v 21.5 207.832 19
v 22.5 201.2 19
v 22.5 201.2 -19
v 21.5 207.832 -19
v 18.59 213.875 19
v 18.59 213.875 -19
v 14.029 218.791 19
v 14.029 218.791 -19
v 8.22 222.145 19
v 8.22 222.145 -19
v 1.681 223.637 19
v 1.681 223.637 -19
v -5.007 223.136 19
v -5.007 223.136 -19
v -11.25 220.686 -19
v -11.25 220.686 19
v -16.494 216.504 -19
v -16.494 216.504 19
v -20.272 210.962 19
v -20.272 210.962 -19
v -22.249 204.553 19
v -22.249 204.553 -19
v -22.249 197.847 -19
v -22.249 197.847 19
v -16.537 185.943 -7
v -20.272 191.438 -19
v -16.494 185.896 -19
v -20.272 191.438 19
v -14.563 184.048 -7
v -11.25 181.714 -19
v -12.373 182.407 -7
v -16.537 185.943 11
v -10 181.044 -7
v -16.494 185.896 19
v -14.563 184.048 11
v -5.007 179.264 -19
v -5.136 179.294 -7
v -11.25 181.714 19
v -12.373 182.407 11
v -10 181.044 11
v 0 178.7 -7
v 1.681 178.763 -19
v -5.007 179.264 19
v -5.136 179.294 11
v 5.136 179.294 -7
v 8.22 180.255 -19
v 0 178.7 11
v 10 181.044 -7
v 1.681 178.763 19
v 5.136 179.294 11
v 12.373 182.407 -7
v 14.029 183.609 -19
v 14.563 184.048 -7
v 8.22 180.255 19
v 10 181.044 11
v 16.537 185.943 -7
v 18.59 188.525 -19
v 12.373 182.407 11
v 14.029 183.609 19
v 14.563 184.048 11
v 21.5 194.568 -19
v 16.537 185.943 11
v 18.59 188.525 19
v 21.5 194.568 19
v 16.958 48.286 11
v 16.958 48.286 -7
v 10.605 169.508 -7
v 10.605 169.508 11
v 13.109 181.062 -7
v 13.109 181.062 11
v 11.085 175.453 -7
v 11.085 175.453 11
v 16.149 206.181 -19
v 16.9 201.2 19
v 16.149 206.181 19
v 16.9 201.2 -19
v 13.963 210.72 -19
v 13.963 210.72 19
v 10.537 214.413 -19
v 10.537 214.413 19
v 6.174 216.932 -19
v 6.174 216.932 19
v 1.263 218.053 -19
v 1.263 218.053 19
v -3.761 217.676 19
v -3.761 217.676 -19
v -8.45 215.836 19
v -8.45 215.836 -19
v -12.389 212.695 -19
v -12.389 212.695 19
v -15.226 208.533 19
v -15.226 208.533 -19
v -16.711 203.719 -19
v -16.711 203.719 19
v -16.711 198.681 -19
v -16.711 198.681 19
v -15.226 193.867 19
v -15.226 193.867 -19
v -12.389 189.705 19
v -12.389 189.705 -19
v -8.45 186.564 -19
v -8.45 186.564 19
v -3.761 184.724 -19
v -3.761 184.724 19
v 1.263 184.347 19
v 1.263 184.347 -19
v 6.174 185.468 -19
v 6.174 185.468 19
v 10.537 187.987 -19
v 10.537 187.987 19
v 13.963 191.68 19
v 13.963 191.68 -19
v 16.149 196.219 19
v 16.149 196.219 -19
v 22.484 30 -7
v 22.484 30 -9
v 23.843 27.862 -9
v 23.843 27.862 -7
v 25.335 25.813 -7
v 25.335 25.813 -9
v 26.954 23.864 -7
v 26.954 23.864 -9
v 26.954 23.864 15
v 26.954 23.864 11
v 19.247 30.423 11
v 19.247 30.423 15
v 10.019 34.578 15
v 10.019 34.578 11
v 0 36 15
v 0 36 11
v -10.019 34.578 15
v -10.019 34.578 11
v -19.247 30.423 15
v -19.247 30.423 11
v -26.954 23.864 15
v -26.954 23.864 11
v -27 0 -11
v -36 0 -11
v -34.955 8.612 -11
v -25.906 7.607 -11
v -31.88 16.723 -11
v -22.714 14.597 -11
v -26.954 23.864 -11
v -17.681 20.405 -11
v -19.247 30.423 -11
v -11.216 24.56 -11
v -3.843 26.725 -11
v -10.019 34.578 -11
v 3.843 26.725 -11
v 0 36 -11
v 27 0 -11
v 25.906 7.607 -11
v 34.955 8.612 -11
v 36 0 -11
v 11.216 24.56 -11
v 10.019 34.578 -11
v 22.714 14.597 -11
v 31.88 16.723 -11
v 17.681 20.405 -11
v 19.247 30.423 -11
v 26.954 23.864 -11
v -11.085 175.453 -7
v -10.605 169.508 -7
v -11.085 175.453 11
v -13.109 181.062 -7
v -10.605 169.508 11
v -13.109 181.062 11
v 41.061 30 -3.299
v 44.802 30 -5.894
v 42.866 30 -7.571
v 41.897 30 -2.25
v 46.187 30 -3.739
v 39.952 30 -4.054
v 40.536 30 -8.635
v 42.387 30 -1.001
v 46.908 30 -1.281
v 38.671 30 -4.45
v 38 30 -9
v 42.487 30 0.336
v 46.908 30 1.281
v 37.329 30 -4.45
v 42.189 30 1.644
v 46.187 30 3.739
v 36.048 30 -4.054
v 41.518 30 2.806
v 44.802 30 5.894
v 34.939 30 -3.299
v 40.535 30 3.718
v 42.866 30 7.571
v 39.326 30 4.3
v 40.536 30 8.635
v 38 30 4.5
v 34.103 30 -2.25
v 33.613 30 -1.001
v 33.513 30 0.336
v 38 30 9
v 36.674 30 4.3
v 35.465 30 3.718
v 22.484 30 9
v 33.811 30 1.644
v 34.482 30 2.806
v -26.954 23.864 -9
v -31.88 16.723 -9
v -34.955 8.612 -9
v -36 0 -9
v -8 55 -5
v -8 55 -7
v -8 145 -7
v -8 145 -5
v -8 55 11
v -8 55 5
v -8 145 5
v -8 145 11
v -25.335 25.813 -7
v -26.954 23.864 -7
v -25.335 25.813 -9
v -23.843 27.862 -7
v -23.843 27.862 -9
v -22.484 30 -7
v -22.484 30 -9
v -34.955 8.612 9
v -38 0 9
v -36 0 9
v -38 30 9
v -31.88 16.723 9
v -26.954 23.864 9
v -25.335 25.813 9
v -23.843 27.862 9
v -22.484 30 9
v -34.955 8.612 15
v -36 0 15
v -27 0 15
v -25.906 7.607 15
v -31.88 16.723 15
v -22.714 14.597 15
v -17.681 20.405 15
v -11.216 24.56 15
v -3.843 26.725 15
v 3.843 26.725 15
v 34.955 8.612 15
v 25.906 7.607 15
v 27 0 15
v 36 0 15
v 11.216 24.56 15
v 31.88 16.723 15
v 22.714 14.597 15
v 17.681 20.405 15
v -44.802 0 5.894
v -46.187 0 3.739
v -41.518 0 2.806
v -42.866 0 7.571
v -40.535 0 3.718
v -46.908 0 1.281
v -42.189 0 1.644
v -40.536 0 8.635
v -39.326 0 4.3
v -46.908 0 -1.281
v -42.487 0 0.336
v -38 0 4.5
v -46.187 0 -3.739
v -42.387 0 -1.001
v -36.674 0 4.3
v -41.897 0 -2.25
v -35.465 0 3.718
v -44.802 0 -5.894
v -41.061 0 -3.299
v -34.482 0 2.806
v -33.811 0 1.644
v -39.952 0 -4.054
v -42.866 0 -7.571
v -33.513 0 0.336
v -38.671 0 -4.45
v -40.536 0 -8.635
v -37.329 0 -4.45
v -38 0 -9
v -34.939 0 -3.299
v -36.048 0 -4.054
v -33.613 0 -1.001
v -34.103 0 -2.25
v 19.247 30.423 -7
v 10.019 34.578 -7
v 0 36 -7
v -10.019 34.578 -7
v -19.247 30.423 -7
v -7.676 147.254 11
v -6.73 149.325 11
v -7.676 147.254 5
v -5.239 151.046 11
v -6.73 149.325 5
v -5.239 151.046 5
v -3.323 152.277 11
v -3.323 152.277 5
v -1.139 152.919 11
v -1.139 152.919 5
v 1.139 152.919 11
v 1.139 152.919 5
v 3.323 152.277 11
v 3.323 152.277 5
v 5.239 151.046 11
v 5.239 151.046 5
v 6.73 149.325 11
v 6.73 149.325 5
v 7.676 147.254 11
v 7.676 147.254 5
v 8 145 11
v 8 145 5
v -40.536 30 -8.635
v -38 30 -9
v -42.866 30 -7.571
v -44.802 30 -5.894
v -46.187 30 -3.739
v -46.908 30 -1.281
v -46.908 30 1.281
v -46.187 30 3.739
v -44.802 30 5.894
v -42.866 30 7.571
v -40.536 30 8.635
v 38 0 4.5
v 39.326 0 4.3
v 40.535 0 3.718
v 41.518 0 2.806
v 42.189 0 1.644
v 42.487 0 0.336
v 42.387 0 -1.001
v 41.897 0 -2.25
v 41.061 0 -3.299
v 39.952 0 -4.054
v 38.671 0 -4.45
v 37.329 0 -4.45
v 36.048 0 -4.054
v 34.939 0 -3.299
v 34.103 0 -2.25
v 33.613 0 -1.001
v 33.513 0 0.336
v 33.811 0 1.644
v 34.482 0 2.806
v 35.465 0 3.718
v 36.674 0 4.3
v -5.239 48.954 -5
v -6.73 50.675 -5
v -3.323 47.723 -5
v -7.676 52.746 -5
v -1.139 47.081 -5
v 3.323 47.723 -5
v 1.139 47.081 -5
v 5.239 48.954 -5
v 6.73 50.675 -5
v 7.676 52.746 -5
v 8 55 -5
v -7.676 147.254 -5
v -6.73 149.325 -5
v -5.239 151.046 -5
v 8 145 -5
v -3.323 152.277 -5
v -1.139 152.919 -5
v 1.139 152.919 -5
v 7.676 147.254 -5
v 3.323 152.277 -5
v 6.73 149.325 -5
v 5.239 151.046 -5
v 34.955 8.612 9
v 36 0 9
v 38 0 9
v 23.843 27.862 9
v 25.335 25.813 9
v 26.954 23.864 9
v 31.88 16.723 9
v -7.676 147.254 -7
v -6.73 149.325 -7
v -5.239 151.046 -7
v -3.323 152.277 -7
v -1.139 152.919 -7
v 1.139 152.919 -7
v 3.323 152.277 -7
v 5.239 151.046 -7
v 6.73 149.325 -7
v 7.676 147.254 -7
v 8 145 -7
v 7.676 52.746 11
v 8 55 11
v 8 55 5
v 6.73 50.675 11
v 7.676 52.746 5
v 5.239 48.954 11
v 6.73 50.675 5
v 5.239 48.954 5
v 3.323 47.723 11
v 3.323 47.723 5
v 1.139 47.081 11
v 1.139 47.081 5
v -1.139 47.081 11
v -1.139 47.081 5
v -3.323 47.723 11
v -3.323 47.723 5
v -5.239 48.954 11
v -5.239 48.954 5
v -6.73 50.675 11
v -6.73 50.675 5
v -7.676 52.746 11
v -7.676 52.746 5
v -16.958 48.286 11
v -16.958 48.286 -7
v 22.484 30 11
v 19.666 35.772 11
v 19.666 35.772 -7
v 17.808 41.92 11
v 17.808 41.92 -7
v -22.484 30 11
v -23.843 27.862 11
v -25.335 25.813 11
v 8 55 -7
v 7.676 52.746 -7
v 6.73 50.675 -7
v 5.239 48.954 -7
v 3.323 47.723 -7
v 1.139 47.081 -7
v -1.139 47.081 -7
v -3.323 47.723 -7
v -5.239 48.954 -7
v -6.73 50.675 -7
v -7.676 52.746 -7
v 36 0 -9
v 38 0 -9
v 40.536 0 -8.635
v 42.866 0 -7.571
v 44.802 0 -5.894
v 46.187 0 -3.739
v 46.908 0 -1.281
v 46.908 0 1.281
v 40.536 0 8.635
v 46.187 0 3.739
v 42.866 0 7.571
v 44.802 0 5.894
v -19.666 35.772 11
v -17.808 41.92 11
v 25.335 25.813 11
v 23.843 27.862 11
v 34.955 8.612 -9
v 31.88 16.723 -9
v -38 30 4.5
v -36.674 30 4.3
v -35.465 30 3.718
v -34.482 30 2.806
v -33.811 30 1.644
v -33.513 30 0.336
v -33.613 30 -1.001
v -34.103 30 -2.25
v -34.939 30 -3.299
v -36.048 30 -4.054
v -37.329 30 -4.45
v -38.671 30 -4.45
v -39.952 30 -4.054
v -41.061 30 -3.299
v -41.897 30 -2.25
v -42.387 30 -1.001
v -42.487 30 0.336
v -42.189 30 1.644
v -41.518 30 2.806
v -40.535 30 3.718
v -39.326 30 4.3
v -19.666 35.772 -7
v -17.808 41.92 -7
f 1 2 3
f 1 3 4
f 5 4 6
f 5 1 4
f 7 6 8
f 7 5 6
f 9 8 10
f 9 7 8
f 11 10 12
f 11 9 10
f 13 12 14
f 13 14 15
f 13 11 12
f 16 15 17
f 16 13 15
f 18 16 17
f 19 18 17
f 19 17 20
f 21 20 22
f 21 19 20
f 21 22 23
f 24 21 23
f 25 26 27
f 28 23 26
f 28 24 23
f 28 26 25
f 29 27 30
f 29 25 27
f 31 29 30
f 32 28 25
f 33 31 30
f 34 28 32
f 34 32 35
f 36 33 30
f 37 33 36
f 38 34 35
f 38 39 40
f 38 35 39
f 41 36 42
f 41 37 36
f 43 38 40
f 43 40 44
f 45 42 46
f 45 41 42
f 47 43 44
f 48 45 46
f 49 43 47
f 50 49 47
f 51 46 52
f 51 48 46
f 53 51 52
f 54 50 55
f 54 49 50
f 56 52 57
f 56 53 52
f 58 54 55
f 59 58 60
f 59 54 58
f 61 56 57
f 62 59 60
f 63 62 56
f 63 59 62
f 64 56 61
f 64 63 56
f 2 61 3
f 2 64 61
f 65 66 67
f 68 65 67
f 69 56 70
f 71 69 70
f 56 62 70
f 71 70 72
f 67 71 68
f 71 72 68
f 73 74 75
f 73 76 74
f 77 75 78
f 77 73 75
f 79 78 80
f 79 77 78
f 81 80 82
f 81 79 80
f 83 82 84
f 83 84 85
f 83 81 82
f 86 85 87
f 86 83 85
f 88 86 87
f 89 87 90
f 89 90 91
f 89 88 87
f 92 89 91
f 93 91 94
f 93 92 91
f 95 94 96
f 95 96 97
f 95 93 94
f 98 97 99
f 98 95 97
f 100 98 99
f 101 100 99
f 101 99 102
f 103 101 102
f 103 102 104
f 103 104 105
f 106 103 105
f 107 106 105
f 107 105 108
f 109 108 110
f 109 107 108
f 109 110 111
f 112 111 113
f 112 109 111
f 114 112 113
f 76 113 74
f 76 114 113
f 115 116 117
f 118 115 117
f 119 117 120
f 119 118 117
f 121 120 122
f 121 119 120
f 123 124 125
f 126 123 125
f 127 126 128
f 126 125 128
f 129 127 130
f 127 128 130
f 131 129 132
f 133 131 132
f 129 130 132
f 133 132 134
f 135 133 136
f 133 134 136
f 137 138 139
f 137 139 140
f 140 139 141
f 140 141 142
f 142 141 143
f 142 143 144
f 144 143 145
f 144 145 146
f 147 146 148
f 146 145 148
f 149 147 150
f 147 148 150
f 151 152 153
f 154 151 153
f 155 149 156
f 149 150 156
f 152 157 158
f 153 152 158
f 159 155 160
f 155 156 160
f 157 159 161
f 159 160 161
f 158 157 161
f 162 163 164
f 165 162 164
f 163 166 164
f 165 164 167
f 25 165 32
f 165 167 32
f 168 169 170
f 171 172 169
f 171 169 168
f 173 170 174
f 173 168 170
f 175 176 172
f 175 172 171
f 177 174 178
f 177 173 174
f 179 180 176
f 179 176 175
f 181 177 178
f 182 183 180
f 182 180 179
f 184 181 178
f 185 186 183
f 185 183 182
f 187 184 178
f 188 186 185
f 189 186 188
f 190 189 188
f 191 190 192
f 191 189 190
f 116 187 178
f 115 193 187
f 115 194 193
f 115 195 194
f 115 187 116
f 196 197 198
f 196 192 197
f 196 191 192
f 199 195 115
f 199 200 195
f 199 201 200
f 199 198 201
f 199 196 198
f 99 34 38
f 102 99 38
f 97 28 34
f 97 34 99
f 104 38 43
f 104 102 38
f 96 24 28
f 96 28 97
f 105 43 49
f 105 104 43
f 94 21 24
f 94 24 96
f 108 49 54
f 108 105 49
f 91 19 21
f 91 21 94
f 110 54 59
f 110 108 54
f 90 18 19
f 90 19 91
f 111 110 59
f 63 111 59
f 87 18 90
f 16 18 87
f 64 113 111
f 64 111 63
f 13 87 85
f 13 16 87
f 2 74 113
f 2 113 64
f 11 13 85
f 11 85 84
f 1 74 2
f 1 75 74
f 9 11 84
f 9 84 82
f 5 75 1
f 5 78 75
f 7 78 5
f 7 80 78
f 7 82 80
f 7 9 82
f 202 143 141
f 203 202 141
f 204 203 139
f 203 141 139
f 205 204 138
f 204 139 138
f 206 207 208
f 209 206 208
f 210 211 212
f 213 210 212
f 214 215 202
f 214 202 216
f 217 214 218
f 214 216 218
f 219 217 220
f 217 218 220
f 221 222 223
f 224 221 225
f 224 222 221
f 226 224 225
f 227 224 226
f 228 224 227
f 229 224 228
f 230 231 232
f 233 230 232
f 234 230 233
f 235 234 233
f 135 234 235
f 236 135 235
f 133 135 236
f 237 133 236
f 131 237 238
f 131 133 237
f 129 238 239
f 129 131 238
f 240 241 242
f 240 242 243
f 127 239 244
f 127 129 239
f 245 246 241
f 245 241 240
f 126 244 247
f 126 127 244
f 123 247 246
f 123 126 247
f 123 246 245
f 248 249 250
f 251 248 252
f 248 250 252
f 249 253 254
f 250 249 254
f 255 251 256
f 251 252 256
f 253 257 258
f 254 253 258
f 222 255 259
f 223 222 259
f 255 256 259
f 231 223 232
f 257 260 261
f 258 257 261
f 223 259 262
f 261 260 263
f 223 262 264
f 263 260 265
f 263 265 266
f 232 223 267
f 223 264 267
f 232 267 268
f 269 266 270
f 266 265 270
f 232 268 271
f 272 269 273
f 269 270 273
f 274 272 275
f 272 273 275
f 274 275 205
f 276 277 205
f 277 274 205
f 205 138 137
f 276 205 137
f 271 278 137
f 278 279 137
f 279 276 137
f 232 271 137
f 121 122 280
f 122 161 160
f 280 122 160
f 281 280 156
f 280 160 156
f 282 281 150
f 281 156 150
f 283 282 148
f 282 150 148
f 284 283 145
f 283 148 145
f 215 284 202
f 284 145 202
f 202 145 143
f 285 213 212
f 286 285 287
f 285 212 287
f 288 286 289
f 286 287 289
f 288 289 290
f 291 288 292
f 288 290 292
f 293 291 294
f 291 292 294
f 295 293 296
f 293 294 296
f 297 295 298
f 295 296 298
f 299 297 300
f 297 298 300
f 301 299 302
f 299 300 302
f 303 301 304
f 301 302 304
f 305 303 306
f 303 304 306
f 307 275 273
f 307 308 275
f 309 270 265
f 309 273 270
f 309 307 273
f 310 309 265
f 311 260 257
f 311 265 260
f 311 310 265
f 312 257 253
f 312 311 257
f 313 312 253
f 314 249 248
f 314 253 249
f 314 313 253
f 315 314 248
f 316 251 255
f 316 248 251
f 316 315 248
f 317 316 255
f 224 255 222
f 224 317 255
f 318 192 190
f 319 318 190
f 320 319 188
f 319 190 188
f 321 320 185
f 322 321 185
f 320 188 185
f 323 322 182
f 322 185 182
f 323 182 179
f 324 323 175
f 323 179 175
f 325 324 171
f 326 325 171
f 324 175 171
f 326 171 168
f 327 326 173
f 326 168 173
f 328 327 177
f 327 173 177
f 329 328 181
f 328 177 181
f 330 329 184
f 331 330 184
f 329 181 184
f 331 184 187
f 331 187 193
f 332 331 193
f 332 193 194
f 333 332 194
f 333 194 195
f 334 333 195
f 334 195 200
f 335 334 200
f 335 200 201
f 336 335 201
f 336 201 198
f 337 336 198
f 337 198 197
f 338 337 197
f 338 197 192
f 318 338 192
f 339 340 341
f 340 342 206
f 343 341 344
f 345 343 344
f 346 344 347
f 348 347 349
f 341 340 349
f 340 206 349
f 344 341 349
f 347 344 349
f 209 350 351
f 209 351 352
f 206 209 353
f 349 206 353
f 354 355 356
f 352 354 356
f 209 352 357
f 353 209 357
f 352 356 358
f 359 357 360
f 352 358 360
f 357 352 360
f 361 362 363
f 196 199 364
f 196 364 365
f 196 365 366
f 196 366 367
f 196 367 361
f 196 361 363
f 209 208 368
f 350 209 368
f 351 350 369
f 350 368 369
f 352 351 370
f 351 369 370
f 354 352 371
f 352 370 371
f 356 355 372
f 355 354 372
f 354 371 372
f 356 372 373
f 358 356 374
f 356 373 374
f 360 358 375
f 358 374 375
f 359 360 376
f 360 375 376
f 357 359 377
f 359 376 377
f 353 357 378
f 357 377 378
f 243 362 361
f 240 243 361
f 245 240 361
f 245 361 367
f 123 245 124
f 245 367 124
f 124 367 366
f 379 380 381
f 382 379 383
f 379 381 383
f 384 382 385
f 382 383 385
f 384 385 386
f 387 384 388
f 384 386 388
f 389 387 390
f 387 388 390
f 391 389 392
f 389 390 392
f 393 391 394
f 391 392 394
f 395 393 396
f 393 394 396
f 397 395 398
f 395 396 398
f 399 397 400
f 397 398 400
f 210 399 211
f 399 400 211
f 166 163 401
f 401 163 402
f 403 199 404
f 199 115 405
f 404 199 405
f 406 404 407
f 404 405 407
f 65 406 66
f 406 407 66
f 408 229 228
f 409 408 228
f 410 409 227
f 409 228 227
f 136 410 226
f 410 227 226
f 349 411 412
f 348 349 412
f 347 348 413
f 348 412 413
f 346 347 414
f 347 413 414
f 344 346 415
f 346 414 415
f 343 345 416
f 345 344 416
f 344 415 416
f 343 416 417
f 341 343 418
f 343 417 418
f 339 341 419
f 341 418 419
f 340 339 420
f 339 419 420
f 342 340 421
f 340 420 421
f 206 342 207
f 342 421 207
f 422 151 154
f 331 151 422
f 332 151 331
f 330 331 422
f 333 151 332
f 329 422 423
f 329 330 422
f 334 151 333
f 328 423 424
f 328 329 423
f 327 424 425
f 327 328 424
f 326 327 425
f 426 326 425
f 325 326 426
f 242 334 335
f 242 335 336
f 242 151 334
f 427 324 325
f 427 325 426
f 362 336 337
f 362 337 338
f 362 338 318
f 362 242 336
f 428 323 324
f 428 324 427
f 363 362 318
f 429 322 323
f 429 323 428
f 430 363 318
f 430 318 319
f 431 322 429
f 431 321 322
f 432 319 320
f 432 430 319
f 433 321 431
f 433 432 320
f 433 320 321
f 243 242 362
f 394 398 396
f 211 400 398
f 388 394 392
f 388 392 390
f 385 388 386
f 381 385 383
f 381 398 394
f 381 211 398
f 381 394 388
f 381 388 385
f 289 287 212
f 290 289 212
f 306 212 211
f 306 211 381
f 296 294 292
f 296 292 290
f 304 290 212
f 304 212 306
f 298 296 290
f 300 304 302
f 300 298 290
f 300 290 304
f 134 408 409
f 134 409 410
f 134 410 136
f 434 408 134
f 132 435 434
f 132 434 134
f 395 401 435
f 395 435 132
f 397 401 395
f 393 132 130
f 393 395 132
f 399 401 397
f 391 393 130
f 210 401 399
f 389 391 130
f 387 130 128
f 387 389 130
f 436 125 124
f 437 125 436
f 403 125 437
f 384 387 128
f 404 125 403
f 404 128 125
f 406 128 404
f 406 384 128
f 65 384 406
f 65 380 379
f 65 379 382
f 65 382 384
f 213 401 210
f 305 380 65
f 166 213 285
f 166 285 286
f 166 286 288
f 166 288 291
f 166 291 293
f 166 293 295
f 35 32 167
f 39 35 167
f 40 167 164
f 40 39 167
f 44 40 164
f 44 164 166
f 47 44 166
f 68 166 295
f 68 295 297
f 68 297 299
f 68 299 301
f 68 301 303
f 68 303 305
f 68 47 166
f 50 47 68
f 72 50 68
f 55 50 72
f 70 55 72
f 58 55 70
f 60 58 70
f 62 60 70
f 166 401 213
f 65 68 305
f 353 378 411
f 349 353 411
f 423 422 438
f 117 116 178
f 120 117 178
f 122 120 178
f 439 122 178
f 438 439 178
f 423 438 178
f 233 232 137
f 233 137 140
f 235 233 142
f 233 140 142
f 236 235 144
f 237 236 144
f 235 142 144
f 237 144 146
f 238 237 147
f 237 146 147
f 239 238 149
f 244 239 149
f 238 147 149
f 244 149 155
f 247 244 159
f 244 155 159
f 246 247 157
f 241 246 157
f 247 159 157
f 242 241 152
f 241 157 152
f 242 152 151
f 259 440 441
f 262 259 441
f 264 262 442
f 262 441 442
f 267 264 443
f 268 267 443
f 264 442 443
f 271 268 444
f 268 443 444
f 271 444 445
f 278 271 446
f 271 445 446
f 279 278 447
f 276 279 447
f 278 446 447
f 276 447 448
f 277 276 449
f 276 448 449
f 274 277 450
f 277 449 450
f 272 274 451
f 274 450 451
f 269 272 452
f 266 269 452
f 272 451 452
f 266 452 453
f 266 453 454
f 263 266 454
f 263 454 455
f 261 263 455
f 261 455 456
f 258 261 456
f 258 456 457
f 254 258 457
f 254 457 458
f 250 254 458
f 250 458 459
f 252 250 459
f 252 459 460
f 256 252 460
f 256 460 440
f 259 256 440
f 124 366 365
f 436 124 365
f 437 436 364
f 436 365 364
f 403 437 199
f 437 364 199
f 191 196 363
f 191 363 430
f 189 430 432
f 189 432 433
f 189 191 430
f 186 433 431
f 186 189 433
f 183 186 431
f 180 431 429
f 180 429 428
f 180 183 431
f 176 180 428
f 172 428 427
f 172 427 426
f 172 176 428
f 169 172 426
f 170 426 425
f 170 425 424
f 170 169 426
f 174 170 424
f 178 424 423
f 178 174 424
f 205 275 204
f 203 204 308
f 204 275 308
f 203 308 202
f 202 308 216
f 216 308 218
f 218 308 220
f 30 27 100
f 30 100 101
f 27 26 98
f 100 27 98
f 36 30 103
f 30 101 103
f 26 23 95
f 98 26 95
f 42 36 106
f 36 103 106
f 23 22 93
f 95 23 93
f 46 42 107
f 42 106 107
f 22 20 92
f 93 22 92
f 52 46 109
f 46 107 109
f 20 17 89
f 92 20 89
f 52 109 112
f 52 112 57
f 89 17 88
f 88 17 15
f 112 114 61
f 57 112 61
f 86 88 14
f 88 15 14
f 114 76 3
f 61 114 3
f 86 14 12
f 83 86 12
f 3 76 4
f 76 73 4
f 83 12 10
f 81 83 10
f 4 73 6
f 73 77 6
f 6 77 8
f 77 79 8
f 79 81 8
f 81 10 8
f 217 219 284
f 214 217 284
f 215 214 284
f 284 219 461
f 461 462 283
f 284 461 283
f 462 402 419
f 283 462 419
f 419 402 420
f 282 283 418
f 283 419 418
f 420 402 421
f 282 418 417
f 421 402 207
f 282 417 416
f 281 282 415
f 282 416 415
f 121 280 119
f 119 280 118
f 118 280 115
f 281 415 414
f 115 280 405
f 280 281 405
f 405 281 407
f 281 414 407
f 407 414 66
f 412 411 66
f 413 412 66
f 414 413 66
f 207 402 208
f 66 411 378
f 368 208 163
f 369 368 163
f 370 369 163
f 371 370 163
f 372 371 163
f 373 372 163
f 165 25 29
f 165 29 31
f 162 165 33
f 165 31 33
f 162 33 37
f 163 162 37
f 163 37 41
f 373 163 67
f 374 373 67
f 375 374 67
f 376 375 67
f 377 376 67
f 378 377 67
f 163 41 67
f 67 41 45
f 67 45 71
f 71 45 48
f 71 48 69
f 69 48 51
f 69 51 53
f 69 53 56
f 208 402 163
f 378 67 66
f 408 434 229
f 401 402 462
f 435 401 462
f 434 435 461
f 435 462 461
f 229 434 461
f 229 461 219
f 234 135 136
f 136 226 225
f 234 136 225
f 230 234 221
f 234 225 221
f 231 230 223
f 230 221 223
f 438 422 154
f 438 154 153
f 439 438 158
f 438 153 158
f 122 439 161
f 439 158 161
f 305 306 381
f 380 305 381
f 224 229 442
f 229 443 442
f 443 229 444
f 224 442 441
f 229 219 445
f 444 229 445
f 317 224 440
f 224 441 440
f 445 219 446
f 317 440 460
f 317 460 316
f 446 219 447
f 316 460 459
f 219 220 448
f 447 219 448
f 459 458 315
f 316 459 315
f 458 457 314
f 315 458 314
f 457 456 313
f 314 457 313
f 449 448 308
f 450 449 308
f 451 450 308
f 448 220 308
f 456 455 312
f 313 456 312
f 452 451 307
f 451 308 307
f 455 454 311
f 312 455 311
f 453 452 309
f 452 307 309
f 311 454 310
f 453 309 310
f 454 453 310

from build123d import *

# Parameters (mm, degrees)
SKETCH1_R                = 22.5
SKETCH1_R_2              = 16.9
BOSS_EXTRUDE1_DEPTH      = 19
BOSS_EXTRUDE2_DEPTH      = 11
BOSS_EXTRUDE2_DEPTH_BACK = 7
BOSS_EXTRUDE3_DEPTH      = 15
BOSS_EXTRUDE3_DEPTH_BACK = 11
BOSS_EXTRUDE4_DEPTH      = 9
FILLET1_RADIUS           = 9
FILLET1_LENGTH           = 30
FILLET2_RADIUS           = 9
FILLET2_LENGTH           = 30
SKETCH2_R                = 4.5
CUT_EXTRUDE1_DEPTH       = 78
FILLET5_R                = 22.5
BOSS_EXTRUDE5_DEPTH      = 5


with BuildPart() as part:
    # Sketch1 → Boss-Extrude1 (new, symmetric)
    with BuildSketch(Plane.XY):
        with Locations((0, 201.2)):
            Circle(SKETCH1_R)
        with Locations((0, 201.2)):
            Circle(SKETCH1_R_2, mode=Mode.SUBTRACT)
    extrude(amount=BOSS_EXTRUDE1_DEPTH, both=True)

    # Sketch1<3> → Boss-Extrude2 (add, two sides: drawn at the far end of the back side and taken through both)
    with BuildSketch(Plane.XY.offset(-BOSS_EXTRUDE2_DEPTH_BACK)):
        with BuildLine():
            ThreePointArc((-22.483530605, 30), (-24.572828472, 26.825646402), (-26.953938029, 23.863889556))
            ThreePointArc((-26.953938029, 23.863889556), (0, 36), (26.953938029, 23.863889556))
            ThreePointArc((26.953938029, 23.863889556), (24.572828472, 26.825646402), (22.483530605, 30))
            ThreePointArc((22.483530605, 30), (18.612945898, 38.808225452), (16.957576671, 48.285884145))
            Line((16.957576671, 48.285884145), (10, 181.044355629))
            ThreePointArc((10, 181.044355629), (0, 178.7), (-10, 181.044355629))
            Line((-10, 181.044355629), (-16.957576671, 48.285884145))
            ThreePointArc((-16.957576671, 48.285884145), (-18.612945898, 38.808225452), (-22.483530605, 30))
        make_face()
        with BuildLine():
            ThreePointArc((-8, 145), (0, 153), (8, 145))
            Line((8, 145), (8, 55))
            ThreePointArc((8, 55), (0, 47), (-8, 55))
            Line((-8, 55), (-8, 145))
        make_face(mode=Mode.SUBTRACT)
    extrude(amount=BOSS_EXTRUDE2_DEPTH + BOSS_EXTRUDE2_DEPTH_BACK)

    # Sketch1<4> → Boss-Extrude3 (add, two sides: drawn at the far end of the back side and taken through both)
    with BuildSketch(Plane.XY.offset(-BOSS_EXTRUDE3_DEPTH_BACK)):
        with BuildLine():
            ThreePointArc((-26.953938029, 23.863889556), (-33.66260365, 12.760451225), (-36, 0))
            Line((-36, 0), (-27, 0))
            ThreePointArc((-27, 0), (0, 27), (27, 0))
            Line((27, 0), (36, 0))
            ThreePointArc((36, 0), (33.66260365, 12.760451225), (26.953938029, 23.863889556))
            ThreePointArc((26.953938029, 23.863889556), (0, 36), (-26.953938029, 23.863889556))
        make_face()
    extrude(amount=BOSS_EXTRUDE3_DEPTH + BOSS_EXTRUDE3_DEPTH_BACK)

    # Sketch1<6> → Boss-Extrude4 (add, symmetric)
    with BuildSketch(Plane.XY):
        with BuildLine():
            Line((-47, 0), (-36, 0))
            ThreePointArc((-36, 0), (-33.66260365, 12.760451225), (-26.953938029, 23.863889556))
            ThreePointArc((-26.953938029, 23.863889556), (-24.572828472, 26.825646402), (-22.483530605, 30))
            Line((-22.483530605, 30), (-47, 30))
            Line((-47, 30), (-47, 0))
        make_face()
        with BuildLine():
            ThreePointArc((22.483530605, 30), (24.572828472, 26.825646402), (26.953938029, 23.863889556))
            ThreePointArc((26.953938029, 23.863889556), (33.66260365, 12.760451225), (36, 0))
            Line((36, 0), (47, 0))
            Line((47, 0), (47, 30))
            Line((47, 30), (22.483530605, 30))
        make_face()
    extrude(amount=BOSS_EXTRUDE4_DEPTH, both=True)

    # Fillet1: full round fillet: the end face becomes a half cylinder, R = half its width
    fillet1_face = Plane((47, 15, 0), x_dir=(0, 1, 0), z_dir=(1, 0, 0))  # on the end face: x along it, z out of the body
    fillet1_slab = fillet1_face.offset(-FILLET1_RADIUS / 2) * Box(FILLET1_LENGTH, 2 * FILLET1_RADIUS, FILLET1_RADIUS, mode=Mode.PRIVATE)  # the body's end, R deep
    fillet1_round = Plane((38, 15, 0), x_dir=(1, 0, 0), z_dir=(0, 1, 0)) * Cylinder(FILLET1_RADIUS, FILLET1_LENGTH, mode=Mode.PRIVATE)  # its axis R under the face
    add(fillet1_slab - fillet1_round, mode=Mode.SUBTRACT)

    # Fillet2: full round fillet: the end face becomes a half cylinder, R = half its width
    fillet2_face = Plane((-47, 15, 0), x_dir=(0, 1, 0), z_dir=(-1, 0, 0))  # on the end face: x along it, z out of the body
    fillet2_slab = fillet2_face.offset(-FILLET2_RADIUS / 2) * Box(FILLET2_LENGTH, 2 * FILLET2_RADIUS, FILLET2_RADIUS, mode=Mode.PRIVATE)  # the body's end, R deep
    fillet2_round = Plane((-38, 15, 0), x_dir=(-1, 0, 0), z_dir=(0, 1, 0)) * Cylinder(FILLET2_RADIUS, FILLET2_LENGTH, mode=Mode.PRIVATE)  # its axis R under the face
    add(fillet2_slab - fillet2_round, mode=Mode.SUBTRACT)

    # Sketch2 → Cut-Extrude1 (cut)
    with BuildSketch(Plane(origin=(0, 30, 0), x_dir=(1, 0, 0), z_dir=(0, 1, 0))):
        with Locations(Location((38, 0, 0), (0, 0, 270))):
            Circle(SKETCH2_R)
        with Locations(Location((-38, 0, 0), (0, 0, 270))):
            Circle(SKETCH2_R)
    extrude(amount=-CUT_EXTRUDE1_DEPTH, mode=Mode.SUBTRACT)

    # Fillet5
    fillet5_edges = [part.edges().sort_by_distance(p)[0] for p in [
        (-10, 181.044355629, 2),
        (10, 181.044355629, 2),
    ]]
    fillet(fillet5_edges, radius=FILLET5_R)

    # Sketch1<7> → Boss-Extrude5 (add, symmetric)
    with BuildSketch(Plane.XY):
        with BuildLine():
            Line((-8, 145), (-8, 55))
            ThreePointArc((-8, 55), (0, 47), (8, 55))
            Line((8, 55), (8, 145))
            ThreePointArc((8, 145), (0, 153), (-8, 145))
        make_face()
    extrude(amount=BOSS_EXTRUDE5_DEPTH, both=True)


solid = part.part
